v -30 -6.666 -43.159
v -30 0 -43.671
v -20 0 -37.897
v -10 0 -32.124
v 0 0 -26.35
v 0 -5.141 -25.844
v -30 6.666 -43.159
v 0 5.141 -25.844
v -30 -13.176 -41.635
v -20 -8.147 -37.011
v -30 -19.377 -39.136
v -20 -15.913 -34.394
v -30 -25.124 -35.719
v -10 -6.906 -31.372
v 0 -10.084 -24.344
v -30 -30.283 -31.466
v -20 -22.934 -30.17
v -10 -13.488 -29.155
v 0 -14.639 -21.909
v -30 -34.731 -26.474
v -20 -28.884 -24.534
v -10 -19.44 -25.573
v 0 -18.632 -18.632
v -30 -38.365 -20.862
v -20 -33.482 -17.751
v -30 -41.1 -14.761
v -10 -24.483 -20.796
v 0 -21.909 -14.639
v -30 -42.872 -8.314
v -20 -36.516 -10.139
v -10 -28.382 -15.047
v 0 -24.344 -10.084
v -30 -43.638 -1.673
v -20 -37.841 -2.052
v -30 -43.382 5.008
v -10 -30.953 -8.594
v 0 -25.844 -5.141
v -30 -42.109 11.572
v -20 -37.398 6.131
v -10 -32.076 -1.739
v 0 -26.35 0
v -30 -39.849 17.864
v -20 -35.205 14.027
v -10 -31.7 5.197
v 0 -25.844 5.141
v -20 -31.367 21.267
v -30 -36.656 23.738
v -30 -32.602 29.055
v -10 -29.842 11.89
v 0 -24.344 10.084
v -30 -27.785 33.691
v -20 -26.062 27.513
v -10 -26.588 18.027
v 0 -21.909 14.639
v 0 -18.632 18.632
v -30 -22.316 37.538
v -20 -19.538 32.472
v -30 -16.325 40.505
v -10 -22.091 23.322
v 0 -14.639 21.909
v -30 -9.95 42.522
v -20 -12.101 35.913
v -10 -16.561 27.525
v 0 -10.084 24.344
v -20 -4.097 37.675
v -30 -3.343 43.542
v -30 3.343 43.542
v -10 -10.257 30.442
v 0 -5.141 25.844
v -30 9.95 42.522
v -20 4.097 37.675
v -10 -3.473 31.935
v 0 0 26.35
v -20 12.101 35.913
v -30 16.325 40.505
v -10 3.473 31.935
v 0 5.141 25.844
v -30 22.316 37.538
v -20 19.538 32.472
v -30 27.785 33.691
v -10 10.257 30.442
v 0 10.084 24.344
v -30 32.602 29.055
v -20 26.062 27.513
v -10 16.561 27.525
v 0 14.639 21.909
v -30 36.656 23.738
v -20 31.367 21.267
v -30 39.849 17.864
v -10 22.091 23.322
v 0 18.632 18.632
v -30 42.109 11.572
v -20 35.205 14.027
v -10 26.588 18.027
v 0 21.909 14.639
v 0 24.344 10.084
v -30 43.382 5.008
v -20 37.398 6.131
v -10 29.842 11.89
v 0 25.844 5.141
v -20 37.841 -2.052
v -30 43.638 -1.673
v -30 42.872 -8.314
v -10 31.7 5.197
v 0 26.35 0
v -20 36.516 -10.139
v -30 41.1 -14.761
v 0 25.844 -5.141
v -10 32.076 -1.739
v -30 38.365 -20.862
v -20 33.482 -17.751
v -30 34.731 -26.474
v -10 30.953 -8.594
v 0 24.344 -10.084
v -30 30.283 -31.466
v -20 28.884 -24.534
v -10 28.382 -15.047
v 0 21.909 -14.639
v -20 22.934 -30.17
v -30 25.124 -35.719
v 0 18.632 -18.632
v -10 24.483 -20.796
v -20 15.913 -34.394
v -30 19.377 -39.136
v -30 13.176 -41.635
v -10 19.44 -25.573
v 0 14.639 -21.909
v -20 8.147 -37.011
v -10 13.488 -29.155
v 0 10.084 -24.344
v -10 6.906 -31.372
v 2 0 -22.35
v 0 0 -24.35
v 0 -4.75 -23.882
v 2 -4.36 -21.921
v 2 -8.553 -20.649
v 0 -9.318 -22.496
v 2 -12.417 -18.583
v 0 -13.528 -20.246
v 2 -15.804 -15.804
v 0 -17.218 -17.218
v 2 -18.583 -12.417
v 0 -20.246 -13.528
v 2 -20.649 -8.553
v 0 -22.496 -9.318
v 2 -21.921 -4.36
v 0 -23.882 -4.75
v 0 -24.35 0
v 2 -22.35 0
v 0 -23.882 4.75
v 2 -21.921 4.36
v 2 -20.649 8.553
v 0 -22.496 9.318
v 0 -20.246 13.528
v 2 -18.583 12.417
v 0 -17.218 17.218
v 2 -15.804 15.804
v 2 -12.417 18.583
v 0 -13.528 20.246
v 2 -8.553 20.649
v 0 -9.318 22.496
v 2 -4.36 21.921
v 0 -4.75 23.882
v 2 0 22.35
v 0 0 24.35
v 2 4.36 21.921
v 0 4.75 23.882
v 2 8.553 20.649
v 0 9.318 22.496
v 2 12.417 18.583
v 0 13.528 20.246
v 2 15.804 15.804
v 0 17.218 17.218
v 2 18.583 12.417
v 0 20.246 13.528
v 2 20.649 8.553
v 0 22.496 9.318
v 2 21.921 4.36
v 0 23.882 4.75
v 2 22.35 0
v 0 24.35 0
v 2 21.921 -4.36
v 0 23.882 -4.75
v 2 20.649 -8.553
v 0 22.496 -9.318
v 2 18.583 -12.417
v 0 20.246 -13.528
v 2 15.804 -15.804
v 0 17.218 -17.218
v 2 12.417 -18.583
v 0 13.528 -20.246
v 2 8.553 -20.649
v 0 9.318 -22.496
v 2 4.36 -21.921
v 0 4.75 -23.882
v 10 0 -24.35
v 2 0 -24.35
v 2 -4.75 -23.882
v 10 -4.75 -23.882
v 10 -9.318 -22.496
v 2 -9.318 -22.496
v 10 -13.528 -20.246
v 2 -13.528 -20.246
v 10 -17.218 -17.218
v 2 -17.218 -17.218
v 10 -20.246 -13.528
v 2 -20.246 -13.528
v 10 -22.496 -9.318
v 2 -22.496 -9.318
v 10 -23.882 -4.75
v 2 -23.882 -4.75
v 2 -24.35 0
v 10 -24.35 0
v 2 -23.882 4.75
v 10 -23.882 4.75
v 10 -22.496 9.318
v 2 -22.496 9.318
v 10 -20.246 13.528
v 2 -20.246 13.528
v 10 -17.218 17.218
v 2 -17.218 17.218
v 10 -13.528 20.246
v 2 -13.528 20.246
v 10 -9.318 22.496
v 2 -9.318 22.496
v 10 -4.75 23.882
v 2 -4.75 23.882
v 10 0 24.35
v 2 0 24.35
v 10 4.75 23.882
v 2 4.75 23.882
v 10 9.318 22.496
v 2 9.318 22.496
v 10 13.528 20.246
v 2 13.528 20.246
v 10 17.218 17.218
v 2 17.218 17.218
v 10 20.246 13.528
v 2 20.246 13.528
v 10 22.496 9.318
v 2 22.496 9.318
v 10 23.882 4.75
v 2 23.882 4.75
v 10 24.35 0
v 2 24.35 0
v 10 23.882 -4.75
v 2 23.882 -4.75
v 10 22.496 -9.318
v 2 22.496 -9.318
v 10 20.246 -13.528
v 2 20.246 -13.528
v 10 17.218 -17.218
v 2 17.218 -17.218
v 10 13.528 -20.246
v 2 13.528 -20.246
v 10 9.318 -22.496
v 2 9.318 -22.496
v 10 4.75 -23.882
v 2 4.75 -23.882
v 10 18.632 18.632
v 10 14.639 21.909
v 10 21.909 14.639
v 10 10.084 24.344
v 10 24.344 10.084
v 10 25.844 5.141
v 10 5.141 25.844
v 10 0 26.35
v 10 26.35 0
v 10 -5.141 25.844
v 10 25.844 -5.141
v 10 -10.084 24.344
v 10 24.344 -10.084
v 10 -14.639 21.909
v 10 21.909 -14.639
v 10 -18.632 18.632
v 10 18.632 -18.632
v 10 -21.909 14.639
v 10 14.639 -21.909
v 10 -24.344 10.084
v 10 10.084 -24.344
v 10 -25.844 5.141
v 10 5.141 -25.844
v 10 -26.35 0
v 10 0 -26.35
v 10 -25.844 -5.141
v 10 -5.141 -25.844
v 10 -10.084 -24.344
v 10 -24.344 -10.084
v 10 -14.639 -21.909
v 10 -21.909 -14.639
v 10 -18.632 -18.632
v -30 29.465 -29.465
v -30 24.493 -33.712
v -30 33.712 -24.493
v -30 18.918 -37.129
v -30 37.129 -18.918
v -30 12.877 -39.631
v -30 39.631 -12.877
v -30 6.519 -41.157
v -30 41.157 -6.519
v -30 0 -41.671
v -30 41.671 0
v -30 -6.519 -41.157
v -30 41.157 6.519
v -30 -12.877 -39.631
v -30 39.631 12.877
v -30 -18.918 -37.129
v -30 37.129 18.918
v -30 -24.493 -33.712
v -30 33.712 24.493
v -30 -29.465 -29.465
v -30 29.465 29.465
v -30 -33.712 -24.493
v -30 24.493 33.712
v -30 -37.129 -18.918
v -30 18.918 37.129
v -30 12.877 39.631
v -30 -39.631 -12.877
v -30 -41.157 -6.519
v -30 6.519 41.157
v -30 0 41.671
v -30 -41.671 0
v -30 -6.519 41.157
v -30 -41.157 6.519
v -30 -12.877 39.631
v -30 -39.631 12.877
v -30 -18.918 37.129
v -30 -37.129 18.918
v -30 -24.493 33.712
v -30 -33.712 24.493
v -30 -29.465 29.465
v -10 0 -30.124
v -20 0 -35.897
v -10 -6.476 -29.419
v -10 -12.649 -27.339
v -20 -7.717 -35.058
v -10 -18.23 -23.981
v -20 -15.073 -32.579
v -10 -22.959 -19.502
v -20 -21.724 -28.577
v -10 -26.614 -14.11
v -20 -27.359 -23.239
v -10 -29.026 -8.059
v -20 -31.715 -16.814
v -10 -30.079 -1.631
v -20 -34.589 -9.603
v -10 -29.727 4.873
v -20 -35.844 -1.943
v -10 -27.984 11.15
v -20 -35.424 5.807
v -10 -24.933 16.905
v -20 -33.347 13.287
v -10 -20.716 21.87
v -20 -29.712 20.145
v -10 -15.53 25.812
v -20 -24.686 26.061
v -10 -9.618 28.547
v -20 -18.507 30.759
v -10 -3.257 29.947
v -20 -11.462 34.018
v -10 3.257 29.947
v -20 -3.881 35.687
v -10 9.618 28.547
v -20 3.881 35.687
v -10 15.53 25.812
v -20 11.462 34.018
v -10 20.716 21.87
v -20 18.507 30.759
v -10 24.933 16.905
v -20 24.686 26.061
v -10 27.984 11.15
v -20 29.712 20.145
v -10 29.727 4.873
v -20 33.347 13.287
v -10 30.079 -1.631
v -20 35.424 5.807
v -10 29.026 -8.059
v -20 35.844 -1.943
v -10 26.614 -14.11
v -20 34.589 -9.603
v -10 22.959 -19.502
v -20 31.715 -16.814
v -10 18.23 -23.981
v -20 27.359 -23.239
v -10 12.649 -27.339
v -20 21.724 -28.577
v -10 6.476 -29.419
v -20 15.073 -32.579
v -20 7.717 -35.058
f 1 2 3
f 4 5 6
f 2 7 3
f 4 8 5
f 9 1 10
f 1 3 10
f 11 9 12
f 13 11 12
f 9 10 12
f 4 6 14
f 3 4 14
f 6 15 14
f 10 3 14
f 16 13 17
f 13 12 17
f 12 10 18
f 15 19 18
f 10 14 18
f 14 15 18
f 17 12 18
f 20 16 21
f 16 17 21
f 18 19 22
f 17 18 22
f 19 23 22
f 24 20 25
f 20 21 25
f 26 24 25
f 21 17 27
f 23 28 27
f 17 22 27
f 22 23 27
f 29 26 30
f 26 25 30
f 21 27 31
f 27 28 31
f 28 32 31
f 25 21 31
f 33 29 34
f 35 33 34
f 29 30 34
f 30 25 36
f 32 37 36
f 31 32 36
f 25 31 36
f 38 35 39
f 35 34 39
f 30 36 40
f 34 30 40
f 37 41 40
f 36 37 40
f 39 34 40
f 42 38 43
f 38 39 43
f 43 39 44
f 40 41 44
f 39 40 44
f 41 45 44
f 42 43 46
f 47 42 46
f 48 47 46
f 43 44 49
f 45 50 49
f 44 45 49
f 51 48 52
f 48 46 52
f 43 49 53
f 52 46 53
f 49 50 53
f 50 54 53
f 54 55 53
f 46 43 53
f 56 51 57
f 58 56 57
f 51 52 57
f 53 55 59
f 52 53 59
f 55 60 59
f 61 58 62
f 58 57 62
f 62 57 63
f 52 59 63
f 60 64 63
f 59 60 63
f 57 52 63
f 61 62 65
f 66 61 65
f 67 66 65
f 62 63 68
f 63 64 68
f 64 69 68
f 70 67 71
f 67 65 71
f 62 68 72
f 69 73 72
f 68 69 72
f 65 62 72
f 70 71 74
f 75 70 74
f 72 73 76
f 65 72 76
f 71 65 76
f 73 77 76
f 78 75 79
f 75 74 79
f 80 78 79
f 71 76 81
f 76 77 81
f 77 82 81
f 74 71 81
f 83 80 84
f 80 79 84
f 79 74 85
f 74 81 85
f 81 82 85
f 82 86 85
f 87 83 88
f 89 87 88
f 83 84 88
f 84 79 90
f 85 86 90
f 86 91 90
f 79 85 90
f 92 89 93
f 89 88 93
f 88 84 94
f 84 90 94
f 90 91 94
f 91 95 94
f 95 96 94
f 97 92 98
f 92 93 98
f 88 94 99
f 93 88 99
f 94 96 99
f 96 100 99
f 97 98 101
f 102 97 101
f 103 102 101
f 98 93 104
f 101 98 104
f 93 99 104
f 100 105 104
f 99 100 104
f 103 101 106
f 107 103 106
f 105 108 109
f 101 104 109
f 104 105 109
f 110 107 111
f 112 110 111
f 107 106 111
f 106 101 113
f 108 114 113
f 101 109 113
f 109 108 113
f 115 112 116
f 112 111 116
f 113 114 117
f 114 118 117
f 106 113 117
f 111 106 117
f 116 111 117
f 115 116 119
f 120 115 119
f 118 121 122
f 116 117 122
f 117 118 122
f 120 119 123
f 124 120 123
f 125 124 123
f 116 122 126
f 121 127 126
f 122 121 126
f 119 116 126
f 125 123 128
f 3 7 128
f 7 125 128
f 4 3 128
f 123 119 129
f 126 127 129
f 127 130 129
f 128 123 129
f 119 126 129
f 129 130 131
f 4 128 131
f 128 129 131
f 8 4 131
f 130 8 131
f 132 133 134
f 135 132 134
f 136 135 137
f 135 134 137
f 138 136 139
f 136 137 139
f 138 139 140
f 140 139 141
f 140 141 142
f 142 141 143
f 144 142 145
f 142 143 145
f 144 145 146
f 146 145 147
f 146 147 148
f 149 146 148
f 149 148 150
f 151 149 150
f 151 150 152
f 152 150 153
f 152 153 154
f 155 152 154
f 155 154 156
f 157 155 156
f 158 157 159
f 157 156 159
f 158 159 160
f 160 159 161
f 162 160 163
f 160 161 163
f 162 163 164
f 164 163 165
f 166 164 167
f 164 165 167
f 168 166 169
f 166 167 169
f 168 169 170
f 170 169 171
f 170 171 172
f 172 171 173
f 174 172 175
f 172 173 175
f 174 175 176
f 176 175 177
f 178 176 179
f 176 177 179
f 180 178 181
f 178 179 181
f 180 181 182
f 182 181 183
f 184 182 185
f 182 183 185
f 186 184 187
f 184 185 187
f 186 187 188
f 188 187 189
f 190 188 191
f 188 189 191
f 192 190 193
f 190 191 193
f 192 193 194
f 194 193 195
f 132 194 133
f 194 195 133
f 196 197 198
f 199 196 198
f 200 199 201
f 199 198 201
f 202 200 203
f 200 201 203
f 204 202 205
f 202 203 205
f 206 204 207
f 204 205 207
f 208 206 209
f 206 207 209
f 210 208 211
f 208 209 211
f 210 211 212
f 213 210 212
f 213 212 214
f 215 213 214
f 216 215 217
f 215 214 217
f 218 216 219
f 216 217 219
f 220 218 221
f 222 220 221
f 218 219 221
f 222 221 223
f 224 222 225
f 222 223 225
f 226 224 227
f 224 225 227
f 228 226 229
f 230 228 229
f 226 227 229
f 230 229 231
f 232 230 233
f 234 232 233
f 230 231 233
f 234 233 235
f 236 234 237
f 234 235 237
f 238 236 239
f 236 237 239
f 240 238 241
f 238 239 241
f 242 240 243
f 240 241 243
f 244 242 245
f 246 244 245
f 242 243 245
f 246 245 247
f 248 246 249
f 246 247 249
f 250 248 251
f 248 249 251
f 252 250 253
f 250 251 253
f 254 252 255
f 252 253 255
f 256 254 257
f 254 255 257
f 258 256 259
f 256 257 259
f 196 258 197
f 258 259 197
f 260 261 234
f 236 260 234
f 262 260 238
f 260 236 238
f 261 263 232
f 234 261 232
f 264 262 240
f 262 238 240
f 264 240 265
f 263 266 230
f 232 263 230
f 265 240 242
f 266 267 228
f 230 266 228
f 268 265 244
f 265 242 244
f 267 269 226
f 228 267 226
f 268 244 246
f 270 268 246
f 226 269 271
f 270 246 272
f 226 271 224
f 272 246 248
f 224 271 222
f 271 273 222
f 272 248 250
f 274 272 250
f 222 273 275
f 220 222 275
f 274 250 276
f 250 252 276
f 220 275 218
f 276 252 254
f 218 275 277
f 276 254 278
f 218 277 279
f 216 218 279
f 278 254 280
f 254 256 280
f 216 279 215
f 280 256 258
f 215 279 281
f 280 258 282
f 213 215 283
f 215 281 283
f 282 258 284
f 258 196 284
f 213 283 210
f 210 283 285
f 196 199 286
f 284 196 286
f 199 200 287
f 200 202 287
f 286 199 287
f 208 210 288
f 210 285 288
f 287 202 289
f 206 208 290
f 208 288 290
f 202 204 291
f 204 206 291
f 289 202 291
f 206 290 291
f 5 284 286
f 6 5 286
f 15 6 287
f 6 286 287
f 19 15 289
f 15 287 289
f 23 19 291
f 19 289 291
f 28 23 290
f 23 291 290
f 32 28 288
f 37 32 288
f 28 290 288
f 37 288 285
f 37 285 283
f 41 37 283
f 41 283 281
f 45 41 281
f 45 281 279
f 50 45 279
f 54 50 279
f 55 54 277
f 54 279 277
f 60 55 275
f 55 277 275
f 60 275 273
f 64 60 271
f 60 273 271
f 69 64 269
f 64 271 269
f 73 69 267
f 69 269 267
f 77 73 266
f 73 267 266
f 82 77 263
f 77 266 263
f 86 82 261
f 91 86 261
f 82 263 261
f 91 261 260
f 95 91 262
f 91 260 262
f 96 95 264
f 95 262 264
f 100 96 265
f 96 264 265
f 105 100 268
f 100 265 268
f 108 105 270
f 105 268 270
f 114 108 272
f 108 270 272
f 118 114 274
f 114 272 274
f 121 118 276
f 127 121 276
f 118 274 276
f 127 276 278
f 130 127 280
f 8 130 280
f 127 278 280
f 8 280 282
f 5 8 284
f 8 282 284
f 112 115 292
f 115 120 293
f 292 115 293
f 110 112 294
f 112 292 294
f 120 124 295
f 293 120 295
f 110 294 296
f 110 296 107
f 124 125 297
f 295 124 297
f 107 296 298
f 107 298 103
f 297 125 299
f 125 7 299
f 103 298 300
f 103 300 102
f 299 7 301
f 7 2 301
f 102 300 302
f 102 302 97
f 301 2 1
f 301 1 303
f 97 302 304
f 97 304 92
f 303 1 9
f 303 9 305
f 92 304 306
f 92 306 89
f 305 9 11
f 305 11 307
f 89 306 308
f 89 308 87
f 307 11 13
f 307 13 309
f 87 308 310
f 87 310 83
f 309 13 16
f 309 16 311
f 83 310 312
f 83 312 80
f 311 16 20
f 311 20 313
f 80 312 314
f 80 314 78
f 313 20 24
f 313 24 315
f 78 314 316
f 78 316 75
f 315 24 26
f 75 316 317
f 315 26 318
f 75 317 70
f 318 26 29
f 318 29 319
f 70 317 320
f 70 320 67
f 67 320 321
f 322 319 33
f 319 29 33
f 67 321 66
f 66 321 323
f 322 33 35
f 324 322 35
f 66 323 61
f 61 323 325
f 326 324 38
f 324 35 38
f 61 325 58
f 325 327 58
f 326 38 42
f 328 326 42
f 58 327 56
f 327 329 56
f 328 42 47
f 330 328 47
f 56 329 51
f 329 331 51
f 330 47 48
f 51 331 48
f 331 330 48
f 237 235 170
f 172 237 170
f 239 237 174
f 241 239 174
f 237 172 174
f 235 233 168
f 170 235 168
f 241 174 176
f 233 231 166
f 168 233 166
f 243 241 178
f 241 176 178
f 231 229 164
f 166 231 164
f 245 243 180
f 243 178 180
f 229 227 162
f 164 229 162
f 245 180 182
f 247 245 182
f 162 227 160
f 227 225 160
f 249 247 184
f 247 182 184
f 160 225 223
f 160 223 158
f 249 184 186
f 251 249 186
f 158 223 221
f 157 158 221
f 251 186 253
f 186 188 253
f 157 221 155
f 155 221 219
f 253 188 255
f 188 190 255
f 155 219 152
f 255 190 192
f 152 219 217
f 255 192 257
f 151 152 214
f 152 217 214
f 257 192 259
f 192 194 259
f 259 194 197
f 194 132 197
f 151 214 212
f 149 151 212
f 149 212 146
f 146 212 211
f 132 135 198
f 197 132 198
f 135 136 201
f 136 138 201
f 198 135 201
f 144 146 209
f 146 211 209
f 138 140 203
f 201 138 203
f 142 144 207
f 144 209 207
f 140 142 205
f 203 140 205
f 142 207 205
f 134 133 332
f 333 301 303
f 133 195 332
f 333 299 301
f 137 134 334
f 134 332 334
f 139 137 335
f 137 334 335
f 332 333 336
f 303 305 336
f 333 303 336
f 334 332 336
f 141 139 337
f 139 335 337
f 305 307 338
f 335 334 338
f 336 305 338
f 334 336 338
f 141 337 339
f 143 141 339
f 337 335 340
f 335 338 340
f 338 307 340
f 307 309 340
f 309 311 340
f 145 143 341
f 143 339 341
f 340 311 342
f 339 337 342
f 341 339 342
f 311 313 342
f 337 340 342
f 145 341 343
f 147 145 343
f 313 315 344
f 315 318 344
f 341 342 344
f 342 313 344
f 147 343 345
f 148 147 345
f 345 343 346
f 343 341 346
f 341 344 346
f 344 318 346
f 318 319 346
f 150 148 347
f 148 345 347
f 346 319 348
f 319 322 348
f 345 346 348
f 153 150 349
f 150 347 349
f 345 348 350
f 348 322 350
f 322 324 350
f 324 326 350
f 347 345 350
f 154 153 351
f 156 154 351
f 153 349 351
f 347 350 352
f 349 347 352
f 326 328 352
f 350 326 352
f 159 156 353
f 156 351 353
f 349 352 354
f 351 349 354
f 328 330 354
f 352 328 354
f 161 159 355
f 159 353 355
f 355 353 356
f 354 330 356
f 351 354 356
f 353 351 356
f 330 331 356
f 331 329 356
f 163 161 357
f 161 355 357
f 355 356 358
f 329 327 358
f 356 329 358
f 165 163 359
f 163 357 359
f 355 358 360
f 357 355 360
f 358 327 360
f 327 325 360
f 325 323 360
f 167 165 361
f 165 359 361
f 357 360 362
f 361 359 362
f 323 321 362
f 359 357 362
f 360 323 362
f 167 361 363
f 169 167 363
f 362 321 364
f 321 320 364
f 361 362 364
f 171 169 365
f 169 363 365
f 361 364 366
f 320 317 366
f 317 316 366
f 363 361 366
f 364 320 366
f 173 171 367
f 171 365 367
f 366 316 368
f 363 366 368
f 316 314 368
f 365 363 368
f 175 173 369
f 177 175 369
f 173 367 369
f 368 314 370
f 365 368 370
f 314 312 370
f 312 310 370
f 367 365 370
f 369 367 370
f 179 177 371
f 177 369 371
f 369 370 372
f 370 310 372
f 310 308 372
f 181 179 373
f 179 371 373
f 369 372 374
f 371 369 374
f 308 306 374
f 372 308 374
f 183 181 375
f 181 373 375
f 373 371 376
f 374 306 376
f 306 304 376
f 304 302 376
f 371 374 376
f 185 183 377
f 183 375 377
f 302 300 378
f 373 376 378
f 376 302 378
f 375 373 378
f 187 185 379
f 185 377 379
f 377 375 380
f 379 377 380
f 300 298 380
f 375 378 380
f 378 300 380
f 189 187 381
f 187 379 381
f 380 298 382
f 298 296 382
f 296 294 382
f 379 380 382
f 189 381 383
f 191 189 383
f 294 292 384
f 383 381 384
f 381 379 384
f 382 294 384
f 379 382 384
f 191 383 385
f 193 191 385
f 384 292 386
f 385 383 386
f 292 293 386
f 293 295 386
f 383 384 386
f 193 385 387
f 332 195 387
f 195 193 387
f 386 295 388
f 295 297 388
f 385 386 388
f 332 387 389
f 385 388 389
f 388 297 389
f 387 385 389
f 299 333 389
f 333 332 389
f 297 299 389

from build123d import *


with BuildPart() as f1:
    # F0 (on Front) → F1 (revolve)
    with BuildSketch(Plane.XZ):
        Polygon((-30, -41.6705080757), (-30, -43.6705080757), (0, -26.35), (10, -26.35), (10, -24.35), (2, -24.35), (2, -22.35), (0, -24.35), align=None)
    revolve(axis=Axis((-15, 0, 0), (-1, 0, 0)))

    # F0 (on Front) → F2 (revolve)
    with BuildSketch(Plane.XZ):
        Polygon((-30, -41.6705080757), (-30, -43.6705080757), (0, -26.35), (10, -26.35), (10, -24.35), (2, -24.35), (2, -22.35), (0, -24.35), align=None)
    revolve(axis=Axis((-15, 0, 0), (-1, 0, 0)))


solid = f1.part
